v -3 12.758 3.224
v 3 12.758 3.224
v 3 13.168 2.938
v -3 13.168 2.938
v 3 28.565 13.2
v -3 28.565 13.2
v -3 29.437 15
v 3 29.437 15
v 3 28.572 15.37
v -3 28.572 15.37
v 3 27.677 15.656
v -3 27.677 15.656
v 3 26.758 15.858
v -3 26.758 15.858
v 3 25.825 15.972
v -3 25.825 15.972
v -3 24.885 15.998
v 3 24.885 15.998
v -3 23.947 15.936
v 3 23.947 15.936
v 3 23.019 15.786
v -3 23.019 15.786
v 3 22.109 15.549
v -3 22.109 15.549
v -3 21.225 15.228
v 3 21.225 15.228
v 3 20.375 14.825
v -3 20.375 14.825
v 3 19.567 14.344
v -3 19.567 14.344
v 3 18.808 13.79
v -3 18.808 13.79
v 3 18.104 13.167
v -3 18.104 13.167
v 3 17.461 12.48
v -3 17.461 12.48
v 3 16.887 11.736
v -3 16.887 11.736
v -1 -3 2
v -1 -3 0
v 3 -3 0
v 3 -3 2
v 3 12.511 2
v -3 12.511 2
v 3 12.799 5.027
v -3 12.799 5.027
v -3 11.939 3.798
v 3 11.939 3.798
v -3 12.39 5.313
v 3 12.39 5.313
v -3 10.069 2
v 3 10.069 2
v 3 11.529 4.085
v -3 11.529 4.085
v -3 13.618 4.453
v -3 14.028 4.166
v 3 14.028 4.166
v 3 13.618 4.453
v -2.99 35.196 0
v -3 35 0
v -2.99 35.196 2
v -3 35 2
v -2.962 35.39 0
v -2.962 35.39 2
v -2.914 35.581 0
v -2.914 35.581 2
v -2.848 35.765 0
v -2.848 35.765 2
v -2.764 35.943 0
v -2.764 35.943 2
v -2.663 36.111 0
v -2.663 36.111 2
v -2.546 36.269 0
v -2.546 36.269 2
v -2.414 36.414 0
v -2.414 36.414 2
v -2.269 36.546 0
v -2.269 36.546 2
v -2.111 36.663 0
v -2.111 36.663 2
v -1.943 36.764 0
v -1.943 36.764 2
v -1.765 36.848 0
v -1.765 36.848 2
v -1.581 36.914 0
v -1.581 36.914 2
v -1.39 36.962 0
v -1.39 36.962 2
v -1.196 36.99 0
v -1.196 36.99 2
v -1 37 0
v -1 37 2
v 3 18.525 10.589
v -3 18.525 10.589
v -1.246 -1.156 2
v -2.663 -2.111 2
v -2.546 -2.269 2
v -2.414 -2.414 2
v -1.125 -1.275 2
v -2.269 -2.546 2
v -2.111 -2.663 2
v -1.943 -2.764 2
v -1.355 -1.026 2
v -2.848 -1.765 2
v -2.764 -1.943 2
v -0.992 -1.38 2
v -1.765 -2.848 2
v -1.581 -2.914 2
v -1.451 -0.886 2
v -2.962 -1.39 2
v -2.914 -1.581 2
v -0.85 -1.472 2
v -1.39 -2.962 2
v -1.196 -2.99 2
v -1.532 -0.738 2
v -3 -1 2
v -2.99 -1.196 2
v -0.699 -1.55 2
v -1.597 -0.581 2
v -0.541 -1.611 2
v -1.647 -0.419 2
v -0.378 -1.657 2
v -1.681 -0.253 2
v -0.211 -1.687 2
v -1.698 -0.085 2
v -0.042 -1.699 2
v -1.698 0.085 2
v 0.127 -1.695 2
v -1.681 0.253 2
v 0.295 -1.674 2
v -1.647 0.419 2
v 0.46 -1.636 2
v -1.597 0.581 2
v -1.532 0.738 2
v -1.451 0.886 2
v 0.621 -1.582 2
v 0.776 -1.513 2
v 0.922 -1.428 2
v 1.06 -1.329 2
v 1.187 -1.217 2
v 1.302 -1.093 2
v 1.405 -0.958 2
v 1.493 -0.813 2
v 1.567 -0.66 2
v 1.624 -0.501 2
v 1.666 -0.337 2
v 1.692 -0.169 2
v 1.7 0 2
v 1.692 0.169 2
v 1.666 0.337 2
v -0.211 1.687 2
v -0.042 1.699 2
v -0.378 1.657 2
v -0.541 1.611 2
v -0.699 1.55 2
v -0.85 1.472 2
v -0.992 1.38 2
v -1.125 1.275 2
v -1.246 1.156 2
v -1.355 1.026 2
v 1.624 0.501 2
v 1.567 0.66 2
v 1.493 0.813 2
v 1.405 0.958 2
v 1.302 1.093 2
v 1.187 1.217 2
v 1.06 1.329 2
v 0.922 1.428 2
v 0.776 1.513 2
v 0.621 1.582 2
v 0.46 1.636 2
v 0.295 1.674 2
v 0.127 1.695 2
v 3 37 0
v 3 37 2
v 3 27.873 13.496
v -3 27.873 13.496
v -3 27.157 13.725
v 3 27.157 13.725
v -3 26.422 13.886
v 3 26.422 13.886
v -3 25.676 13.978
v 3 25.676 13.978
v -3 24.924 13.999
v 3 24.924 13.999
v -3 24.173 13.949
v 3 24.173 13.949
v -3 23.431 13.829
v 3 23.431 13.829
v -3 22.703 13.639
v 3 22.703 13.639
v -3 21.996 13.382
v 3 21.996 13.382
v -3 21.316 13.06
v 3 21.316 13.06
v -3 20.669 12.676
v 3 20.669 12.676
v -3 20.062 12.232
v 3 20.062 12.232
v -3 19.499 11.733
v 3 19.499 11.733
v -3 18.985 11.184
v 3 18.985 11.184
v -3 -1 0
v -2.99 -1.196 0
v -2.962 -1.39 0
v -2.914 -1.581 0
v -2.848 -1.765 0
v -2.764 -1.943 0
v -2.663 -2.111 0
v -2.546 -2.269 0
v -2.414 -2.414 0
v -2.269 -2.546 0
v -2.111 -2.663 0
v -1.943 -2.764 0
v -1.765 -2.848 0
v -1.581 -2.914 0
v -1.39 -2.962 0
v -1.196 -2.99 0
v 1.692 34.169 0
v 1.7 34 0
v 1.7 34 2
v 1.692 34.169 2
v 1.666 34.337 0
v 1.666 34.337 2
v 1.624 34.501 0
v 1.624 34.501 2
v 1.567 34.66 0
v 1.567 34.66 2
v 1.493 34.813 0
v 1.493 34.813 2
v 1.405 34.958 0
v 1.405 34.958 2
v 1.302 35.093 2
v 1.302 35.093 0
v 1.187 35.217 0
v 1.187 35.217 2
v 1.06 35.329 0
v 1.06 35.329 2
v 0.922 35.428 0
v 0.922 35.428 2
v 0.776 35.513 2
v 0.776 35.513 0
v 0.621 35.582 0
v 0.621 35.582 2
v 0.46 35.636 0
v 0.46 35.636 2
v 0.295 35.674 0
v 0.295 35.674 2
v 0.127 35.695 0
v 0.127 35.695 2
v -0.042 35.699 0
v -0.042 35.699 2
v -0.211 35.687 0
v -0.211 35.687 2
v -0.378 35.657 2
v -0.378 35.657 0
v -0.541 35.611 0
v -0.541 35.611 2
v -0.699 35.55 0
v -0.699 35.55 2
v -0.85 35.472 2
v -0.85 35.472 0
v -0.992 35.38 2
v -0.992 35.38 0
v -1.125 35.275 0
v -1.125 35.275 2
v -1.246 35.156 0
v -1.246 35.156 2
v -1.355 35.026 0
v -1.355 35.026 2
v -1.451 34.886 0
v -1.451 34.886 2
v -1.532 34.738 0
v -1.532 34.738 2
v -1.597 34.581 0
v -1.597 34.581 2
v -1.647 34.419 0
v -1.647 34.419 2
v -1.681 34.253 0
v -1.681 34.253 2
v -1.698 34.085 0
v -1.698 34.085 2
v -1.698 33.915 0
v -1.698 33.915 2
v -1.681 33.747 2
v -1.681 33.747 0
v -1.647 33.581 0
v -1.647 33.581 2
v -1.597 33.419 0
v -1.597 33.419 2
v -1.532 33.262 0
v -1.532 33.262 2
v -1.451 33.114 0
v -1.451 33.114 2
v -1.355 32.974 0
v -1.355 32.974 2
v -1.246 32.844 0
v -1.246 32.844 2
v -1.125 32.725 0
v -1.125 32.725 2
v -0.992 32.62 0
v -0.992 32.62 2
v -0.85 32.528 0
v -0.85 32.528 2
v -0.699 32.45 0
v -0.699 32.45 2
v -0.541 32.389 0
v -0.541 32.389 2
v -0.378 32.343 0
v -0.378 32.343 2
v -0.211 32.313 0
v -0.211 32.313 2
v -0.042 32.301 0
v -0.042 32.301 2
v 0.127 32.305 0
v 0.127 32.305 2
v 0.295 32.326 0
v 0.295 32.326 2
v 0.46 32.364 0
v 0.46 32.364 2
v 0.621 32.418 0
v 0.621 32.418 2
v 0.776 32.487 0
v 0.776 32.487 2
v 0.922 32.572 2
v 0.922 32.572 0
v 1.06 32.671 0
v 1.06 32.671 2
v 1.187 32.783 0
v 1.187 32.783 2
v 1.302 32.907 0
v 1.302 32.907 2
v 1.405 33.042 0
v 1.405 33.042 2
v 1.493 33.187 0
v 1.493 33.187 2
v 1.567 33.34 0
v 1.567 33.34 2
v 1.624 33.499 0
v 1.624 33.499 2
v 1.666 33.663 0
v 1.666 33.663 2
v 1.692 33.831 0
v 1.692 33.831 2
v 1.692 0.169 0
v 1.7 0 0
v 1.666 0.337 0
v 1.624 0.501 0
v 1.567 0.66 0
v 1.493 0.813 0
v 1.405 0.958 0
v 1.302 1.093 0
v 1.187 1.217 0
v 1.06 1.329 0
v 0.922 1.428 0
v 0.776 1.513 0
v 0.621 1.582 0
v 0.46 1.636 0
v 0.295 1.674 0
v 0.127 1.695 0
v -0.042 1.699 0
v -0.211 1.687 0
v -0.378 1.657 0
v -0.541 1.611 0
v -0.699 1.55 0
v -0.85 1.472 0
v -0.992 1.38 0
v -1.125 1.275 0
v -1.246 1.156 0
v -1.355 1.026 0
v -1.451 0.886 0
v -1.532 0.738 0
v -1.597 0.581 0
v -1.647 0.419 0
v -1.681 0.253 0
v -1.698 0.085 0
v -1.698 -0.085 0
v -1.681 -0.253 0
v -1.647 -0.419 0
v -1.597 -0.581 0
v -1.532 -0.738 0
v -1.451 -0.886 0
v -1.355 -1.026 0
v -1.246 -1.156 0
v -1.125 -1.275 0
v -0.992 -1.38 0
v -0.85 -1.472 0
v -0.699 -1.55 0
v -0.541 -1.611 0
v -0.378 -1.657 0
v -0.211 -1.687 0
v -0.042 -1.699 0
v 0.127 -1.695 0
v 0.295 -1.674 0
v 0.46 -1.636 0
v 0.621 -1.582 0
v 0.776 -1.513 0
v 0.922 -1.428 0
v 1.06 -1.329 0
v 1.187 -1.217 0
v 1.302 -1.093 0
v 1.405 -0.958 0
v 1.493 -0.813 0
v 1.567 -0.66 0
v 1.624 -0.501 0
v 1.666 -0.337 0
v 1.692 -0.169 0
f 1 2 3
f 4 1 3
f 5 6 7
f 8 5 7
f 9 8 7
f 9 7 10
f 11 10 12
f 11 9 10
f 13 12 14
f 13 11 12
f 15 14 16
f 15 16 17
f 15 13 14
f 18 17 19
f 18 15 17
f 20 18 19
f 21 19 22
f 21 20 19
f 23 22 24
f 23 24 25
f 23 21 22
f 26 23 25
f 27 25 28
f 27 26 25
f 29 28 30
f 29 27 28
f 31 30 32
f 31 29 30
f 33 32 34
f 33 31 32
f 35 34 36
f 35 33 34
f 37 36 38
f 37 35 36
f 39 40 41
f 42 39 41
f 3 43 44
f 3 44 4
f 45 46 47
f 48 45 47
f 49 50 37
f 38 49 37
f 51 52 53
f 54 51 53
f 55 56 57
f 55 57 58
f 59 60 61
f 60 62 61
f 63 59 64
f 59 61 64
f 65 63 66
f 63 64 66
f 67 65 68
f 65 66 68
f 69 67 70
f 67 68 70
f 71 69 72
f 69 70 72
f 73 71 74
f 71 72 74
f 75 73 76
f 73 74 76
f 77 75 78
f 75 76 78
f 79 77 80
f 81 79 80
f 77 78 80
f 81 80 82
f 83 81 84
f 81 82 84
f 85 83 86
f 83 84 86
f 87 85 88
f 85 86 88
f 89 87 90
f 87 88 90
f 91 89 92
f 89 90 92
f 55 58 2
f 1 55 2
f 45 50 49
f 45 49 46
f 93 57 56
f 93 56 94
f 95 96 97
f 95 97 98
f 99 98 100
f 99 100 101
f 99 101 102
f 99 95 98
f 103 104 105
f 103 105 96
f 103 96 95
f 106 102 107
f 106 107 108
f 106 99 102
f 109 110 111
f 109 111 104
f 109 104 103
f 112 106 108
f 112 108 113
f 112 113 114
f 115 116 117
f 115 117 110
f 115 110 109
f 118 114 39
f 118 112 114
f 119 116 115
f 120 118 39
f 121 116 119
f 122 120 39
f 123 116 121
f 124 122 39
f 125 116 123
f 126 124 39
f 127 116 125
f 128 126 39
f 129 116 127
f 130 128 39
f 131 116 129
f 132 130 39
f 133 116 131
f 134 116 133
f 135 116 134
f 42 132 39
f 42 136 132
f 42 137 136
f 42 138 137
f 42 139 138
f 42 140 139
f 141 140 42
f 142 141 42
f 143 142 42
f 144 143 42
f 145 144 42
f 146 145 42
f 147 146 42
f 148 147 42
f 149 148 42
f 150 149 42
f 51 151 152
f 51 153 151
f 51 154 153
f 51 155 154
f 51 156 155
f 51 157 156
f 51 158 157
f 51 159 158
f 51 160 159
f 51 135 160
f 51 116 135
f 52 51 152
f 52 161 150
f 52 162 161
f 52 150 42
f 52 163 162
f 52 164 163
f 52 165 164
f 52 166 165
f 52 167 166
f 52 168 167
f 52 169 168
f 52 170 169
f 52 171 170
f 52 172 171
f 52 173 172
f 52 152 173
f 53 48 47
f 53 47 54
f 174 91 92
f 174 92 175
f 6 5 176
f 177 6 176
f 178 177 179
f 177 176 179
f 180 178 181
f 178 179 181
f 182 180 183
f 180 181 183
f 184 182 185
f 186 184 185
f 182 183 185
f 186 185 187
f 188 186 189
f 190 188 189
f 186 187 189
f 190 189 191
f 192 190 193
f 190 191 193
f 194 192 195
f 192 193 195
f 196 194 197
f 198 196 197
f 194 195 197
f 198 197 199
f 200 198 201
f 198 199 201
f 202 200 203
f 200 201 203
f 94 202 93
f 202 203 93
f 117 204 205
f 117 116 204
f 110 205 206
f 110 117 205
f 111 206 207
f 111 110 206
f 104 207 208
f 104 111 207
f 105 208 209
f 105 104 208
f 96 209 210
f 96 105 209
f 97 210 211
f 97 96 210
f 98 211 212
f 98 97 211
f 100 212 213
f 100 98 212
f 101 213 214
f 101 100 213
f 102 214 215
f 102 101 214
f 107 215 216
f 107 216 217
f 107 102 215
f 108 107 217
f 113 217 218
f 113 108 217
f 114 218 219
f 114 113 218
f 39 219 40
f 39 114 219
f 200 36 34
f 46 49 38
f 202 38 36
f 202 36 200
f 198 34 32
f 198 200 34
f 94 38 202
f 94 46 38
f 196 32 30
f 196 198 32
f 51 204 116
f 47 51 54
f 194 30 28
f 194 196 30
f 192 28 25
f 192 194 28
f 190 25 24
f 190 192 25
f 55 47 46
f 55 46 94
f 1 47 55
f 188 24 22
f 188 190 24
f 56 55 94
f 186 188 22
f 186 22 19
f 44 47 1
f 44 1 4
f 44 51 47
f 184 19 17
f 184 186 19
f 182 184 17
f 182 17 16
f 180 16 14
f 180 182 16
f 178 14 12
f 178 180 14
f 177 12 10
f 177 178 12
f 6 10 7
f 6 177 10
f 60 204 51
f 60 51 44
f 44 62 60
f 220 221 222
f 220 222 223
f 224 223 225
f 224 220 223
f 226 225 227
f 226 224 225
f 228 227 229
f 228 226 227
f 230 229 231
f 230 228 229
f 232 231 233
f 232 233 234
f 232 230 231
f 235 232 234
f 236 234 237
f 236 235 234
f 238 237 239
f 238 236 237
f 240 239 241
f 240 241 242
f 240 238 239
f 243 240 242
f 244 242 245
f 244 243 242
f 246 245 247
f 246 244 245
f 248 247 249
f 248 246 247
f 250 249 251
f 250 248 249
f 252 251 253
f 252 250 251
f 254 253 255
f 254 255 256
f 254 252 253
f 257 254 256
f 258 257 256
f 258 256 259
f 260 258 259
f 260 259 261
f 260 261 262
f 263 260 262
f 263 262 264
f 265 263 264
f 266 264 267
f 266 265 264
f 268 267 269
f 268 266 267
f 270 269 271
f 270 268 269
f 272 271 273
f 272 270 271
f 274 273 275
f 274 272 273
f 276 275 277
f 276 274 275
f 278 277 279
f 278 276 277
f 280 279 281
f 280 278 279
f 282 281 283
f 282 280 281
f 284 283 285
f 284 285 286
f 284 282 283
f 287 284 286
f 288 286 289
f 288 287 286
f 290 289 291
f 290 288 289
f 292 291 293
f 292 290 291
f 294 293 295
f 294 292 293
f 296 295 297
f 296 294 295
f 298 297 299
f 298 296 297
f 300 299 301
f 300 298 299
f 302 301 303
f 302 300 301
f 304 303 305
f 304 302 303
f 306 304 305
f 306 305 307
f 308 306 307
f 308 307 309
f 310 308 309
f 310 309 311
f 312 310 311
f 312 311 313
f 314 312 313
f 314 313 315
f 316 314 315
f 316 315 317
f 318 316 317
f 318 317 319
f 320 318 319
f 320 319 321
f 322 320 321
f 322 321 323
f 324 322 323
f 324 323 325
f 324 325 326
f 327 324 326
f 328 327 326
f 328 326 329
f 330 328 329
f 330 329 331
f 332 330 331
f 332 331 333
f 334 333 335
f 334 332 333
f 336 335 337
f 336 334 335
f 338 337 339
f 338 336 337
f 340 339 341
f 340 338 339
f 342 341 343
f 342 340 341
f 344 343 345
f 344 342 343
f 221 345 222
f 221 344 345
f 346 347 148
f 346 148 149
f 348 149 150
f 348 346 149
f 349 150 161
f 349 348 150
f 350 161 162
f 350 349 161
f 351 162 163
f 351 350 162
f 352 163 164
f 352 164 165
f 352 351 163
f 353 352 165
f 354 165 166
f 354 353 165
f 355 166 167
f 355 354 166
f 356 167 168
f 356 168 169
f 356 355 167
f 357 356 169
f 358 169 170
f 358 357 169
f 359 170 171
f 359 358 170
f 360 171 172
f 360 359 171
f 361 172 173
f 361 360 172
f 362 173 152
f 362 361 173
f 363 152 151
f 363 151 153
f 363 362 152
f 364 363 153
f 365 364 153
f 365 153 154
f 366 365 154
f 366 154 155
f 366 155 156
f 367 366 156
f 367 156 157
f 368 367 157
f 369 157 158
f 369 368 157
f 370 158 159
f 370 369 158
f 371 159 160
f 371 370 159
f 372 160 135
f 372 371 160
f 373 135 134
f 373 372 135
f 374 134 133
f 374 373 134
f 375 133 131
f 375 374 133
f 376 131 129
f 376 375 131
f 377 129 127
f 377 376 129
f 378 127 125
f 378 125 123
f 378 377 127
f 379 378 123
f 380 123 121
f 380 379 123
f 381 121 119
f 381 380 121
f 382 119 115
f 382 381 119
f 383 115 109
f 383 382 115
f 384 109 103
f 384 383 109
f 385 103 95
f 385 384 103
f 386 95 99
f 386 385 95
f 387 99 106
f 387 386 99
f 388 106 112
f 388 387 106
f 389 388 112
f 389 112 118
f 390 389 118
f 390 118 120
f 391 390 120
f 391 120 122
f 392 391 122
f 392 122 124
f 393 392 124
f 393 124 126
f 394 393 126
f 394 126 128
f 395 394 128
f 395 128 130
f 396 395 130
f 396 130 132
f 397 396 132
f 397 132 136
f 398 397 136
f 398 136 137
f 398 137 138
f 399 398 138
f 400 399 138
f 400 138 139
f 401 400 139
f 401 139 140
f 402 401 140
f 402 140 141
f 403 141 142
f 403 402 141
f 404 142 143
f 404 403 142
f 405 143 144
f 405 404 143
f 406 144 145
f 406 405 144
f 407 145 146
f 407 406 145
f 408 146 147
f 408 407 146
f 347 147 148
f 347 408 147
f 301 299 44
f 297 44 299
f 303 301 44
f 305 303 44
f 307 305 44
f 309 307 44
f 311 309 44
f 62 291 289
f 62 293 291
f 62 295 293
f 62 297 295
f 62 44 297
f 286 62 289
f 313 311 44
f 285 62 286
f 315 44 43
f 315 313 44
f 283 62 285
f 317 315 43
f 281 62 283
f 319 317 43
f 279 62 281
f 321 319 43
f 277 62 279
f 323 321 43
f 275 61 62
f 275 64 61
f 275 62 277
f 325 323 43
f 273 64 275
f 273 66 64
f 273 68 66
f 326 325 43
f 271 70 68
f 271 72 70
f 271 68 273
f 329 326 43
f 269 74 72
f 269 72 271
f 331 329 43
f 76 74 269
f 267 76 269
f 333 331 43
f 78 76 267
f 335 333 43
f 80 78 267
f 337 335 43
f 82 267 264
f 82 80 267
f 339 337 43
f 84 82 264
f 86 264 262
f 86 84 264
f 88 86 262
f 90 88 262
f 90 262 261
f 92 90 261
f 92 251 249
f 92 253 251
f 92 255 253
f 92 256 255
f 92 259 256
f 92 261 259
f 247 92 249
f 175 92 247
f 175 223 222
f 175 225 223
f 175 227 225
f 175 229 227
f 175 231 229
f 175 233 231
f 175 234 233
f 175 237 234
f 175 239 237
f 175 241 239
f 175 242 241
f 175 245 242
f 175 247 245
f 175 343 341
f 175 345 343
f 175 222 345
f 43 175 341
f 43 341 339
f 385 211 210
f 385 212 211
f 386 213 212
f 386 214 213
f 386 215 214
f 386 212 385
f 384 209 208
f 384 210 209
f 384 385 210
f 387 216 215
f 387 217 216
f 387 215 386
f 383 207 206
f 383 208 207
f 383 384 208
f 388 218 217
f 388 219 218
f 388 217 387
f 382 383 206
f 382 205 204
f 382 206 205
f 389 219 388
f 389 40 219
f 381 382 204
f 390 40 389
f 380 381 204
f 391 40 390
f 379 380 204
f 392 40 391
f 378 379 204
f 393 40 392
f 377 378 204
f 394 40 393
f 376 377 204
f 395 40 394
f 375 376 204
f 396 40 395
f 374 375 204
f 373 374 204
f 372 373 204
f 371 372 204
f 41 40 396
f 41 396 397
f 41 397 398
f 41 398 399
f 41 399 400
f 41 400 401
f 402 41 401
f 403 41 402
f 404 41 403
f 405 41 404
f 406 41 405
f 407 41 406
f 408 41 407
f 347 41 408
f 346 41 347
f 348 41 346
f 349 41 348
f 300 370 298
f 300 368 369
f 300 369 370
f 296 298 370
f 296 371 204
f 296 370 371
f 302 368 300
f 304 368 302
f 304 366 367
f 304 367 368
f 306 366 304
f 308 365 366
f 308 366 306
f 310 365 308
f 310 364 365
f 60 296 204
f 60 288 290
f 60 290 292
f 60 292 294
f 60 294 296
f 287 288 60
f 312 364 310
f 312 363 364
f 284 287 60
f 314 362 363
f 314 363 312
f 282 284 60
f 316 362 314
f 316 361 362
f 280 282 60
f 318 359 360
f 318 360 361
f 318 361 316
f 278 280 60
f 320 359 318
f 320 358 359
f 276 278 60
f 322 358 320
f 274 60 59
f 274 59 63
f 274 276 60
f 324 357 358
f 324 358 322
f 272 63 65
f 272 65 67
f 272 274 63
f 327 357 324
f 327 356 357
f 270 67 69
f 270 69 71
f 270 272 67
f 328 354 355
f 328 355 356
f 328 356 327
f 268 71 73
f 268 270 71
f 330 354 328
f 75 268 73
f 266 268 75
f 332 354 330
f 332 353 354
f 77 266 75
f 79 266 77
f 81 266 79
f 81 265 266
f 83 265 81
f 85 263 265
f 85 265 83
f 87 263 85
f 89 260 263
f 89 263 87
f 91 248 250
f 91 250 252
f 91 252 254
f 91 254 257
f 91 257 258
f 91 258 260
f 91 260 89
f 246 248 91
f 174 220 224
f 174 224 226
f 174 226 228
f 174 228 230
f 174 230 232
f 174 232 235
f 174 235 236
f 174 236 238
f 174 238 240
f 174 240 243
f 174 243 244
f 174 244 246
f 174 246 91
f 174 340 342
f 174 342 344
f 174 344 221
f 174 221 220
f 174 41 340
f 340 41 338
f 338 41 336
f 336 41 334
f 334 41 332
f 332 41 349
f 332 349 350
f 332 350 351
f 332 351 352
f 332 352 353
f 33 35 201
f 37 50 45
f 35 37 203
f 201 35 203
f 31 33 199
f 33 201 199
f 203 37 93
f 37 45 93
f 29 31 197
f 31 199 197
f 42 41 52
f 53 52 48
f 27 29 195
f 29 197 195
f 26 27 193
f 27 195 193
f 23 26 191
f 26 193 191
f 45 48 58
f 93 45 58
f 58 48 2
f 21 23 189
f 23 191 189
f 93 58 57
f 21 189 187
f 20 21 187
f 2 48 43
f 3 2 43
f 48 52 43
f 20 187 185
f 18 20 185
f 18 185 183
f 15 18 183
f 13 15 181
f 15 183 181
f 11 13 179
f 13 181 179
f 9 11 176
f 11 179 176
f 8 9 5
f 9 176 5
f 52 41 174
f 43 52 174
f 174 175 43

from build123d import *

# Parameters (mm, degrees)
SKETCH_W     = 6
SKETCH_H     = 40
SKETCH_R     = 1.7
PAD_DEPTH    = 2
FILLET_R     = 2
PAD001_DEPTH = 6
POCKET_DEPTH = 6.001


with BuildPart() as part:
    # Sketch → Pad (new body)
    with BuildSketch(Plane.XY):
        with Locations((0, 17)):
            Rectangle(SKETCH_W, SKETCH_H)
        Circle(SKETCH_R, mode=Mode.SUBTRACT)
        with Locations((0, 34)):
            Circle(SKETCH_R, mode=Mode.SUBTRACT)
    extrude(amount=PAD_DEPTH)

    # Fillet
    fillet_edges = [part.edges().sort_by_distance(p)[0] for p in [
        (-3, -3, 1),
        (-3, 37, 1),
    ]]
    fillet(fillet_edges, radius=FILLET_R)

    # Sketch001 → Pad001 (new body)
    with BuildSketch(Plane.YZ.offset(3)):
        with BuildLine():
            Line((8.669063, 0), (11.110612, 0))
            Line((11.110612, 0), (18.524817, 10.588582))
            ThreePointArc((28.565173, 13.2), (23.064315, 13.742406), (18.524817, 10.588582))
            Line((28.565173, 13.2), (29.436953, 15))
            ThreePointArc((29.436953, 15), (22.560894, 15.678011), (16.886524, 11.735751))
            Line((8.669063, 0), (16.886524, 11.735751))
        make_face()
    extrude(amount=-PAD001_DEPTH)

    # Sketch002 → Pocket (cut, through all)
    with BuildSketch(Plane.YZ.offset(3)):
        Polygon((11.938785, 3.797924), (10.300481, 4.945077), (11.160846, 6.173805), (12.79915, 5.026652), align=None)
        Polygon((13.618302, 4.453075), (12.757937, 3.224347), (13.577089, 2.650771), (14.437454, 3.879499), align=None)
    extrude(amount=-POCKET_DEPTH, mode=Mode.SUBTRACT)


solid = part.part
